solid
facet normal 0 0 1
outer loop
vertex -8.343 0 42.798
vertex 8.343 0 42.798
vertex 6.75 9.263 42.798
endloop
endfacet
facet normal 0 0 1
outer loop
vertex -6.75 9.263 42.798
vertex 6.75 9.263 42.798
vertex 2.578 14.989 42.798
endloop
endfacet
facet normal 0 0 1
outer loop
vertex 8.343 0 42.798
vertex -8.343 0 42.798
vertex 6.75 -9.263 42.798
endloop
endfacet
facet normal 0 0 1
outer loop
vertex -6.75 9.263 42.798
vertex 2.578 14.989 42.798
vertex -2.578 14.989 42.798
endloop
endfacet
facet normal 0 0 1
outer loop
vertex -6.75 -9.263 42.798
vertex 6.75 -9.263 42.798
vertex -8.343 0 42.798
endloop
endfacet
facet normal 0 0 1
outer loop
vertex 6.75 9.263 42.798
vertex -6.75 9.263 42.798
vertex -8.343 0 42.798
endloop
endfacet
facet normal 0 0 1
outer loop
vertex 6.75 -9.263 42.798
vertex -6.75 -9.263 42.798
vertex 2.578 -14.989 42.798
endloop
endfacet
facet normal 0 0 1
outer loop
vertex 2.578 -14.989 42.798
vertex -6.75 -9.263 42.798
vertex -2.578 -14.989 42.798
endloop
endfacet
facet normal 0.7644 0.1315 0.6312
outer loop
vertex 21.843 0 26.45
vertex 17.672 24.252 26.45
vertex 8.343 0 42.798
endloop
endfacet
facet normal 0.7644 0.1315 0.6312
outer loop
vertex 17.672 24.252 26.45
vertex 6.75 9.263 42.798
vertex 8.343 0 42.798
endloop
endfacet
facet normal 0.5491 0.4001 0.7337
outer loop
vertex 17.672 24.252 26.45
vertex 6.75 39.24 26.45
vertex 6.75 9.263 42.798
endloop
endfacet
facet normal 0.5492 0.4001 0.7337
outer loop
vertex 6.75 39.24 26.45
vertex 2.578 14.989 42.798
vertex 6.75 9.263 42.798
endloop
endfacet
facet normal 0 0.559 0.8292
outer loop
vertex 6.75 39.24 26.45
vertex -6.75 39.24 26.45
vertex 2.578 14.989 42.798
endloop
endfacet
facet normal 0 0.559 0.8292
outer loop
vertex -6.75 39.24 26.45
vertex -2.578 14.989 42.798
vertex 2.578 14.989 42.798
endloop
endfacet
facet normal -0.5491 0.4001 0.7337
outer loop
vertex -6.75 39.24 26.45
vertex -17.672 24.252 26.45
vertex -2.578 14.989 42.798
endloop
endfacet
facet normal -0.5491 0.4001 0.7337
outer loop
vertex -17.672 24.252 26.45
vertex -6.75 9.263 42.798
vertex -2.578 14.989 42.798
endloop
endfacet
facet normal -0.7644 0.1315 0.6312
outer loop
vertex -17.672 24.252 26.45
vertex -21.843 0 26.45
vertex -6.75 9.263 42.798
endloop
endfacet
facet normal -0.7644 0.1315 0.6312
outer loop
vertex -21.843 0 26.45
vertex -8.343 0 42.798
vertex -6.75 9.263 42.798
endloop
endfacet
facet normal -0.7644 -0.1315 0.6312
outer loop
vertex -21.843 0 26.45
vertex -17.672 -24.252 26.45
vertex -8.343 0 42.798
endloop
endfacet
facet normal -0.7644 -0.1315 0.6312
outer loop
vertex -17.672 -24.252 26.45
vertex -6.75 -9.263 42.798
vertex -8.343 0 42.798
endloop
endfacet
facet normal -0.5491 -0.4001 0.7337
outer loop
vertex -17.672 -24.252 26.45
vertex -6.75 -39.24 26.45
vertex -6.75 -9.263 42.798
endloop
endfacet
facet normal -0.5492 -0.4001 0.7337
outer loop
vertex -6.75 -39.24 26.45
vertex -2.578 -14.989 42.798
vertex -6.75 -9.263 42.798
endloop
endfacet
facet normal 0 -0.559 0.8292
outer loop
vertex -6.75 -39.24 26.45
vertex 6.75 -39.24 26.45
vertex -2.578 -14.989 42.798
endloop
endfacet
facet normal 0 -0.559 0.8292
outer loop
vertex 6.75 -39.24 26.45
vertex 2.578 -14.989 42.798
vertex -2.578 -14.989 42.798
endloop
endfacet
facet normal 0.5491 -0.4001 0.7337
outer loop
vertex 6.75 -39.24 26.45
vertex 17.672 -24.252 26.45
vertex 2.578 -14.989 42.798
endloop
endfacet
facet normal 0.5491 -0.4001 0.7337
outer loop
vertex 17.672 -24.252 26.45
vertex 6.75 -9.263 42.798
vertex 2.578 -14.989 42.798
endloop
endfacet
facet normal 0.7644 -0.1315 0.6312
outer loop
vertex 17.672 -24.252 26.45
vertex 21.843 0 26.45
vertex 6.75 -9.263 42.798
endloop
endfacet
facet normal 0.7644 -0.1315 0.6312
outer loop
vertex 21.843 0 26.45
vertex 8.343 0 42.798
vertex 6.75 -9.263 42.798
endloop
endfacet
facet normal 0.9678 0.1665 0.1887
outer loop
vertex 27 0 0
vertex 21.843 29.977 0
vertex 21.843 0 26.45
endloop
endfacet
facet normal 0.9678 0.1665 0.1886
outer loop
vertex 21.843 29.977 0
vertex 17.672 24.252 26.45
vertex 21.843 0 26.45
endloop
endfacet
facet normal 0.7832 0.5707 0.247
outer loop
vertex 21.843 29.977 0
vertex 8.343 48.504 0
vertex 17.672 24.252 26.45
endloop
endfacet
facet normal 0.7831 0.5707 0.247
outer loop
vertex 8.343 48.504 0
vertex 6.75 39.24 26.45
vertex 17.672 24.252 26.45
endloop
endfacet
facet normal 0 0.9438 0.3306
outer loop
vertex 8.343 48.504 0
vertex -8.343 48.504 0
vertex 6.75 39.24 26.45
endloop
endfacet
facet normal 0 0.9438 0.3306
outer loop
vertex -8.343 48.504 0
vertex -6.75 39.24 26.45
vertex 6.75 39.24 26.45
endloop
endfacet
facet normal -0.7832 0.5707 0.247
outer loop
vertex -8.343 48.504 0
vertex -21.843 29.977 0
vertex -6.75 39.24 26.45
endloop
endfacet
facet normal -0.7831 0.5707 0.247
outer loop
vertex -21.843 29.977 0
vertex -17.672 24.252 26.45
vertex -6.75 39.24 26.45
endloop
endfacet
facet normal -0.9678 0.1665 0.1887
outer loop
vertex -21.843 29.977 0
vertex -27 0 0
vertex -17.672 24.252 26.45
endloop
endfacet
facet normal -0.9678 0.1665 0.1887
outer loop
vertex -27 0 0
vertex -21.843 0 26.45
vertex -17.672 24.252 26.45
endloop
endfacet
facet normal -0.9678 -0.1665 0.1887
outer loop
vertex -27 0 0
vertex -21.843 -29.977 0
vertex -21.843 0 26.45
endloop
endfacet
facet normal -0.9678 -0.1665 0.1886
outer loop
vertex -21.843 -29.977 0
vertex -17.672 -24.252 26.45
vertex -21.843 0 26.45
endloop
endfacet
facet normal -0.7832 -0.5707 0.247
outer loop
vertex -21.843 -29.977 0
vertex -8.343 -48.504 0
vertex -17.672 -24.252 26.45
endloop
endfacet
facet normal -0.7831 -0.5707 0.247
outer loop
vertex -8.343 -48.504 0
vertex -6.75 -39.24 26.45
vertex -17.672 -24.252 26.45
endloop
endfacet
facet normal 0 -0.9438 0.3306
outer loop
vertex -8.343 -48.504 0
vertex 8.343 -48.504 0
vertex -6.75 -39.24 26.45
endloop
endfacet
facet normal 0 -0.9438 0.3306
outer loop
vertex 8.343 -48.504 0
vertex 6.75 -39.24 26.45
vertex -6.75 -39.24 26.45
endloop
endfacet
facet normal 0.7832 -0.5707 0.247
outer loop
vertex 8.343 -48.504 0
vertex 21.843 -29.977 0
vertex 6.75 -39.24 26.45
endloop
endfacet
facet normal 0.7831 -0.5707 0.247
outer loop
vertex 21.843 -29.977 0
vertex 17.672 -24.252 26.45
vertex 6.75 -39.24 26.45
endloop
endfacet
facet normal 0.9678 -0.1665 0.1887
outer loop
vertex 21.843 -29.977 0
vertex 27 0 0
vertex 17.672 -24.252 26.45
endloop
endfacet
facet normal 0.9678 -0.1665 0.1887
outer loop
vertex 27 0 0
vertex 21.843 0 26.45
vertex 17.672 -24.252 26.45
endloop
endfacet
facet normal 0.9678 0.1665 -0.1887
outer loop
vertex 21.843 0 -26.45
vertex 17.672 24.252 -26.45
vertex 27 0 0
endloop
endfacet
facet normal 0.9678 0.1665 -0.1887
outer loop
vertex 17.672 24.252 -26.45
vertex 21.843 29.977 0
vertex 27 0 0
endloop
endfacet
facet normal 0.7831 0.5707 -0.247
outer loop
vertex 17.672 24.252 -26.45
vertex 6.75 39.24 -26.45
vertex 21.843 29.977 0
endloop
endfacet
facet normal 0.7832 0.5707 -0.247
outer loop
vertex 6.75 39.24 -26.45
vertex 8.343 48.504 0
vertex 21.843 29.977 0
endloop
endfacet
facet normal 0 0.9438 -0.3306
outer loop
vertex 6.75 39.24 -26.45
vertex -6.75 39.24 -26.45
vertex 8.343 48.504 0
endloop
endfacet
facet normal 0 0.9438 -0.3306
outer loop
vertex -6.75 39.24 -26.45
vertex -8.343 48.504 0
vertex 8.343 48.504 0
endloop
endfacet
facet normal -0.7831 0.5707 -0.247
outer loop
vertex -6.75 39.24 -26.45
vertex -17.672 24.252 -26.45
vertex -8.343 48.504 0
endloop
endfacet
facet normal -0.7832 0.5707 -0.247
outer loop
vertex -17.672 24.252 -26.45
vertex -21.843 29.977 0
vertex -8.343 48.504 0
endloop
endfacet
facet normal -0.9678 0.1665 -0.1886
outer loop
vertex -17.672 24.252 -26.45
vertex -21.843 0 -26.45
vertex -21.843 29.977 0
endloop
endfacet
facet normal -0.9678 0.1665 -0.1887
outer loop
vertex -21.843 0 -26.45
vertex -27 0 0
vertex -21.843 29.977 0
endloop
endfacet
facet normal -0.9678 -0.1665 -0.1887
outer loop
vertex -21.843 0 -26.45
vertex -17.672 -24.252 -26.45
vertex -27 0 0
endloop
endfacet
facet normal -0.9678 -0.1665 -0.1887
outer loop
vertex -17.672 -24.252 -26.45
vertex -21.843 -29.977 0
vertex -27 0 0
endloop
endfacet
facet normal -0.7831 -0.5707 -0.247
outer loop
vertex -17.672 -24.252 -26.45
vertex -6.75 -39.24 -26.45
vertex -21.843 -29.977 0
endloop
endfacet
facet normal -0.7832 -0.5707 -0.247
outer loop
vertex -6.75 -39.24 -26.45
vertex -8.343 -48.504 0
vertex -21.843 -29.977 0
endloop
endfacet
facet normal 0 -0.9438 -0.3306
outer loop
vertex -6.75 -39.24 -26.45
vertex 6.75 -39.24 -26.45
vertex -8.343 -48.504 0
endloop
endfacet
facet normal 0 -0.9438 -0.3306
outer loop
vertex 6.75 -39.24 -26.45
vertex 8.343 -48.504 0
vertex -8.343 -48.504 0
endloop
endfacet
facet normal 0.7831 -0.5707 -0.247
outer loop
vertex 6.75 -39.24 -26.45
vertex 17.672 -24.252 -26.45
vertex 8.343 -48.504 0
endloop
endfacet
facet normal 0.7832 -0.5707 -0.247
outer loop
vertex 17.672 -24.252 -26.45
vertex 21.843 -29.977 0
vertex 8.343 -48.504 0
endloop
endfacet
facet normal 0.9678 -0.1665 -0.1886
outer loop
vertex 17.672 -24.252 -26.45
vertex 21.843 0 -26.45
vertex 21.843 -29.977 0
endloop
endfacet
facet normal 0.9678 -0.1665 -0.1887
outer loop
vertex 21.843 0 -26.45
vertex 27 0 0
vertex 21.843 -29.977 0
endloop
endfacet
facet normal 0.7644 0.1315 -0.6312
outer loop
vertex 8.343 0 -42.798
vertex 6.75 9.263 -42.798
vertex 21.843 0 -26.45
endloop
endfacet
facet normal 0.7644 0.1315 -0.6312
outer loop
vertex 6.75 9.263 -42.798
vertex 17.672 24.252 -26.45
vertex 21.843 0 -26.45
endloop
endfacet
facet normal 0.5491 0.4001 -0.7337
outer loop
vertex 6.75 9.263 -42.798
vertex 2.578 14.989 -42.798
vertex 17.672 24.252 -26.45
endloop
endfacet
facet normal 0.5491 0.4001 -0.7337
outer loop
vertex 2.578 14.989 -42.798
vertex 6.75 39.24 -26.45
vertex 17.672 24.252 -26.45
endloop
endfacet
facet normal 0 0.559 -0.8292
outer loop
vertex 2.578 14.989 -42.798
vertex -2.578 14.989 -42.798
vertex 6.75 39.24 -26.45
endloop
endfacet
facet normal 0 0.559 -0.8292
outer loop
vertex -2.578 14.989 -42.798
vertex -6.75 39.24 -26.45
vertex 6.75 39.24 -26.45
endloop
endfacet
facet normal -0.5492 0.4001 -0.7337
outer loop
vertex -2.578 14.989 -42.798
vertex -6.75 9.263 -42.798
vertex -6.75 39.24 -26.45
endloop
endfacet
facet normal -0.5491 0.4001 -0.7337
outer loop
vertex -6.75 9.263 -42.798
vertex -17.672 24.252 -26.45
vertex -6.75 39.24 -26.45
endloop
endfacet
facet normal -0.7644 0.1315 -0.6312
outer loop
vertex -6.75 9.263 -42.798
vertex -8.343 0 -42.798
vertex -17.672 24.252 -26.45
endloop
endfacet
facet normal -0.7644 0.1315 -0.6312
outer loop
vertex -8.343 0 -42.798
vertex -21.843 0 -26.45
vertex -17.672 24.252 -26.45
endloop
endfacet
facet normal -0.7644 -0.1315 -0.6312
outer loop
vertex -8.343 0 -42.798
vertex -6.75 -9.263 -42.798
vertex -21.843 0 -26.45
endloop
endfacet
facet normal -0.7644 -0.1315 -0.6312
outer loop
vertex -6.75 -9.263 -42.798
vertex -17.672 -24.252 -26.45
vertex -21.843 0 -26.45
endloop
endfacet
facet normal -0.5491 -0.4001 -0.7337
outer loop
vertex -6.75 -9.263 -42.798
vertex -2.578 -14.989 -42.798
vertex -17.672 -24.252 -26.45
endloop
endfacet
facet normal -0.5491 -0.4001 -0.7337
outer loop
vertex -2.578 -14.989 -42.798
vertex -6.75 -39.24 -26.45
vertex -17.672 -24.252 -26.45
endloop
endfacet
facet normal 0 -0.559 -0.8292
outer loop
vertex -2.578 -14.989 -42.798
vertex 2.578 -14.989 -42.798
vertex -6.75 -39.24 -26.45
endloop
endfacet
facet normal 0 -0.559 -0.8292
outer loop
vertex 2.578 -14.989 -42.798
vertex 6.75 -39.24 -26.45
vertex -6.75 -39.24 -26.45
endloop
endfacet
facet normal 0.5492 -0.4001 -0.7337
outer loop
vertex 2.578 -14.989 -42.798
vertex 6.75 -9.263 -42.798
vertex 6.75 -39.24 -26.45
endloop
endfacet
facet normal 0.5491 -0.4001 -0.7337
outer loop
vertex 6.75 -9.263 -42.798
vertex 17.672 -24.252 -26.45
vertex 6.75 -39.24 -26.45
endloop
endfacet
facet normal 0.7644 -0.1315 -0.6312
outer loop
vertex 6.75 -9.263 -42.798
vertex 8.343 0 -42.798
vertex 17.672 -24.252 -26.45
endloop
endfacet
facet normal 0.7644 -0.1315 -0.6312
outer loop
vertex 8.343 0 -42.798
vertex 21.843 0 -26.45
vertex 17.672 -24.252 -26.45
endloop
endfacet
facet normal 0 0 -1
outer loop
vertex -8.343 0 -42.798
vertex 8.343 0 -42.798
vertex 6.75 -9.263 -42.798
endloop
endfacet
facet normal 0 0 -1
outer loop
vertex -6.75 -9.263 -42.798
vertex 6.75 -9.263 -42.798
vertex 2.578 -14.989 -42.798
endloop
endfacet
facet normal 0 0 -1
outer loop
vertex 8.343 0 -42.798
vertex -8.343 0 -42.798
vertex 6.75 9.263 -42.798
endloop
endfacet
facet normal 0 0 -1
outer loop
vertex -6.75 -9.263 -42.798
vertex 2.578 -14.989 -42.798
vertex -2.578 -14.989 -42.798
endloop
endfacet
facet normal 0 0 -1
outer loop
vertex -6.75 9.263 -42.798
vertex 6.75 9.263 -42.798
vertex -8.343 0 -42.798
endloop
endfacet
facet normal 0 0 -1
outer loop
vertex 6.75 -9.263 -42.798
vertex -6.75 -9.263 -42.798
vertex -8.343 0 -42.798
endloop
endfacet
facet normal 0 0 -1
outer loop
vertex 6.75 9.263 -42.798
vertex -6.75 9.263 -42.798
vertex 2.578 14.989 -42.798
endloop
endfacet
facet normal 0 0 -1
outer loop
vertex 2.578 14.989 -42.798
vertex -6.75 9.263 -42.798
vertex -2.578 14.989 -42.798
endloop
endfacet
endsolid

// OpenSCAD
// Generated by SolidPython 1.0.1 on 2020-07-29 00:46:49


scale(v = [9, 17, 15]) {
	sphere(r = 3);
}
/***********************************************
*********      SolidPython code:      **********
************************************************
 
# import packages: SolidPython
from solid import *
from solid.utils import *
from itertools import chain, combinations, permutations


class Resize:

    def __init__(self, scad_file):
        self.scad_file = scad_file
        #self.scad_file = import_scad(scad_file)
        # cone/cylinder param:
        self.r1 = 0
        self.r2 = 0
        self.h = 0
        # rectangular prism param:
        self.w = 0
        self.l = 0
        # ellipse param:
        self.r = 0

    # import OpenScad code (file name corresponds to shape)


    # classify shape + parameters
    def assign(self, param1, param2, param3):
        if self.scad_file == 'cone.scad':
            self.r1 = param1
            self.r2 = param2
            self.h = param3
        elif self.scad_file == 'cylinder.scad':
            self.r1 = param1
            self.r2 = param2
            self.h = param3
        elif self.scad_file == 'rectangularPrism.scad':
            self.h = param1
            self.l = param2
            self.w = param3
        else:
            self.r = param1
            self.h = param2

    # resize parameters
    def iterate(self):
        x = range(3, 20, 2)
        i = 1
        if self.scad_file == 'cone.scad':
            tempList = list(permutations(x, 2))
            for temp in tempList:
                param1 = temp[0]
                param2 = temp[1]
                filepath = 'produced_scad_files/' + 'cone' + str(param1) + '_' + str(param2) + '_' + '.scad'
                scad_render_to_file(cylinder(h=param1, r1=param2, r2=0), filepath)

        elif self.scad_file == 'cylinder.scad':
            tempList = list(permutations(x, 3))
            for temp in tempList:
                param1 = temp[0]
                param2 = temp[1]
                filepath = 'produced_scad_files/' + 'cylinder' + str(param1) + '_' + str(param2) + '_' + '.scad'
                scad_render_to_file(cylinder(h=param1, r1=param2, r2=param2), filepath)

        elif self.scad_file == 'rectangularPrism.scad':
            tempList = list(permutations(x, 3))
            for temp in tempList:
                param1 = temp[0]
                param2 = temp[1]
                param3 = temp[2]
                filepath = 'produced_scad_files/' + 'rectangularPrism' + str(param1) + '_' + str(param2) + '_' + str(
                    param3) + '.scad'
                scad_render_to_file(cube(size=(param1, param2, param3)), filepath)

        elif self.scad_file == 'ellipse.scad':
            tempList = list(permutations(x, 4))
            for temp in tempList:
                param1 = temp[0]
                param2 = temp[1]
                param3 = temp[2]
                param4 = temp[3]
                filepath = 'produced_scad_files/' + 'ellipse' + str(param1) + '_' + str(param2) + '_' + str(param3) + '_' + str(param4) + '.scad'
                scad_render_to_file(scale([param1, param2, param3])(sphere(r=param4)), filepath)

    def render_to_scadfile(self):
        scad_render_to_file(scad, 'example.scad') 
 
************************************************/
